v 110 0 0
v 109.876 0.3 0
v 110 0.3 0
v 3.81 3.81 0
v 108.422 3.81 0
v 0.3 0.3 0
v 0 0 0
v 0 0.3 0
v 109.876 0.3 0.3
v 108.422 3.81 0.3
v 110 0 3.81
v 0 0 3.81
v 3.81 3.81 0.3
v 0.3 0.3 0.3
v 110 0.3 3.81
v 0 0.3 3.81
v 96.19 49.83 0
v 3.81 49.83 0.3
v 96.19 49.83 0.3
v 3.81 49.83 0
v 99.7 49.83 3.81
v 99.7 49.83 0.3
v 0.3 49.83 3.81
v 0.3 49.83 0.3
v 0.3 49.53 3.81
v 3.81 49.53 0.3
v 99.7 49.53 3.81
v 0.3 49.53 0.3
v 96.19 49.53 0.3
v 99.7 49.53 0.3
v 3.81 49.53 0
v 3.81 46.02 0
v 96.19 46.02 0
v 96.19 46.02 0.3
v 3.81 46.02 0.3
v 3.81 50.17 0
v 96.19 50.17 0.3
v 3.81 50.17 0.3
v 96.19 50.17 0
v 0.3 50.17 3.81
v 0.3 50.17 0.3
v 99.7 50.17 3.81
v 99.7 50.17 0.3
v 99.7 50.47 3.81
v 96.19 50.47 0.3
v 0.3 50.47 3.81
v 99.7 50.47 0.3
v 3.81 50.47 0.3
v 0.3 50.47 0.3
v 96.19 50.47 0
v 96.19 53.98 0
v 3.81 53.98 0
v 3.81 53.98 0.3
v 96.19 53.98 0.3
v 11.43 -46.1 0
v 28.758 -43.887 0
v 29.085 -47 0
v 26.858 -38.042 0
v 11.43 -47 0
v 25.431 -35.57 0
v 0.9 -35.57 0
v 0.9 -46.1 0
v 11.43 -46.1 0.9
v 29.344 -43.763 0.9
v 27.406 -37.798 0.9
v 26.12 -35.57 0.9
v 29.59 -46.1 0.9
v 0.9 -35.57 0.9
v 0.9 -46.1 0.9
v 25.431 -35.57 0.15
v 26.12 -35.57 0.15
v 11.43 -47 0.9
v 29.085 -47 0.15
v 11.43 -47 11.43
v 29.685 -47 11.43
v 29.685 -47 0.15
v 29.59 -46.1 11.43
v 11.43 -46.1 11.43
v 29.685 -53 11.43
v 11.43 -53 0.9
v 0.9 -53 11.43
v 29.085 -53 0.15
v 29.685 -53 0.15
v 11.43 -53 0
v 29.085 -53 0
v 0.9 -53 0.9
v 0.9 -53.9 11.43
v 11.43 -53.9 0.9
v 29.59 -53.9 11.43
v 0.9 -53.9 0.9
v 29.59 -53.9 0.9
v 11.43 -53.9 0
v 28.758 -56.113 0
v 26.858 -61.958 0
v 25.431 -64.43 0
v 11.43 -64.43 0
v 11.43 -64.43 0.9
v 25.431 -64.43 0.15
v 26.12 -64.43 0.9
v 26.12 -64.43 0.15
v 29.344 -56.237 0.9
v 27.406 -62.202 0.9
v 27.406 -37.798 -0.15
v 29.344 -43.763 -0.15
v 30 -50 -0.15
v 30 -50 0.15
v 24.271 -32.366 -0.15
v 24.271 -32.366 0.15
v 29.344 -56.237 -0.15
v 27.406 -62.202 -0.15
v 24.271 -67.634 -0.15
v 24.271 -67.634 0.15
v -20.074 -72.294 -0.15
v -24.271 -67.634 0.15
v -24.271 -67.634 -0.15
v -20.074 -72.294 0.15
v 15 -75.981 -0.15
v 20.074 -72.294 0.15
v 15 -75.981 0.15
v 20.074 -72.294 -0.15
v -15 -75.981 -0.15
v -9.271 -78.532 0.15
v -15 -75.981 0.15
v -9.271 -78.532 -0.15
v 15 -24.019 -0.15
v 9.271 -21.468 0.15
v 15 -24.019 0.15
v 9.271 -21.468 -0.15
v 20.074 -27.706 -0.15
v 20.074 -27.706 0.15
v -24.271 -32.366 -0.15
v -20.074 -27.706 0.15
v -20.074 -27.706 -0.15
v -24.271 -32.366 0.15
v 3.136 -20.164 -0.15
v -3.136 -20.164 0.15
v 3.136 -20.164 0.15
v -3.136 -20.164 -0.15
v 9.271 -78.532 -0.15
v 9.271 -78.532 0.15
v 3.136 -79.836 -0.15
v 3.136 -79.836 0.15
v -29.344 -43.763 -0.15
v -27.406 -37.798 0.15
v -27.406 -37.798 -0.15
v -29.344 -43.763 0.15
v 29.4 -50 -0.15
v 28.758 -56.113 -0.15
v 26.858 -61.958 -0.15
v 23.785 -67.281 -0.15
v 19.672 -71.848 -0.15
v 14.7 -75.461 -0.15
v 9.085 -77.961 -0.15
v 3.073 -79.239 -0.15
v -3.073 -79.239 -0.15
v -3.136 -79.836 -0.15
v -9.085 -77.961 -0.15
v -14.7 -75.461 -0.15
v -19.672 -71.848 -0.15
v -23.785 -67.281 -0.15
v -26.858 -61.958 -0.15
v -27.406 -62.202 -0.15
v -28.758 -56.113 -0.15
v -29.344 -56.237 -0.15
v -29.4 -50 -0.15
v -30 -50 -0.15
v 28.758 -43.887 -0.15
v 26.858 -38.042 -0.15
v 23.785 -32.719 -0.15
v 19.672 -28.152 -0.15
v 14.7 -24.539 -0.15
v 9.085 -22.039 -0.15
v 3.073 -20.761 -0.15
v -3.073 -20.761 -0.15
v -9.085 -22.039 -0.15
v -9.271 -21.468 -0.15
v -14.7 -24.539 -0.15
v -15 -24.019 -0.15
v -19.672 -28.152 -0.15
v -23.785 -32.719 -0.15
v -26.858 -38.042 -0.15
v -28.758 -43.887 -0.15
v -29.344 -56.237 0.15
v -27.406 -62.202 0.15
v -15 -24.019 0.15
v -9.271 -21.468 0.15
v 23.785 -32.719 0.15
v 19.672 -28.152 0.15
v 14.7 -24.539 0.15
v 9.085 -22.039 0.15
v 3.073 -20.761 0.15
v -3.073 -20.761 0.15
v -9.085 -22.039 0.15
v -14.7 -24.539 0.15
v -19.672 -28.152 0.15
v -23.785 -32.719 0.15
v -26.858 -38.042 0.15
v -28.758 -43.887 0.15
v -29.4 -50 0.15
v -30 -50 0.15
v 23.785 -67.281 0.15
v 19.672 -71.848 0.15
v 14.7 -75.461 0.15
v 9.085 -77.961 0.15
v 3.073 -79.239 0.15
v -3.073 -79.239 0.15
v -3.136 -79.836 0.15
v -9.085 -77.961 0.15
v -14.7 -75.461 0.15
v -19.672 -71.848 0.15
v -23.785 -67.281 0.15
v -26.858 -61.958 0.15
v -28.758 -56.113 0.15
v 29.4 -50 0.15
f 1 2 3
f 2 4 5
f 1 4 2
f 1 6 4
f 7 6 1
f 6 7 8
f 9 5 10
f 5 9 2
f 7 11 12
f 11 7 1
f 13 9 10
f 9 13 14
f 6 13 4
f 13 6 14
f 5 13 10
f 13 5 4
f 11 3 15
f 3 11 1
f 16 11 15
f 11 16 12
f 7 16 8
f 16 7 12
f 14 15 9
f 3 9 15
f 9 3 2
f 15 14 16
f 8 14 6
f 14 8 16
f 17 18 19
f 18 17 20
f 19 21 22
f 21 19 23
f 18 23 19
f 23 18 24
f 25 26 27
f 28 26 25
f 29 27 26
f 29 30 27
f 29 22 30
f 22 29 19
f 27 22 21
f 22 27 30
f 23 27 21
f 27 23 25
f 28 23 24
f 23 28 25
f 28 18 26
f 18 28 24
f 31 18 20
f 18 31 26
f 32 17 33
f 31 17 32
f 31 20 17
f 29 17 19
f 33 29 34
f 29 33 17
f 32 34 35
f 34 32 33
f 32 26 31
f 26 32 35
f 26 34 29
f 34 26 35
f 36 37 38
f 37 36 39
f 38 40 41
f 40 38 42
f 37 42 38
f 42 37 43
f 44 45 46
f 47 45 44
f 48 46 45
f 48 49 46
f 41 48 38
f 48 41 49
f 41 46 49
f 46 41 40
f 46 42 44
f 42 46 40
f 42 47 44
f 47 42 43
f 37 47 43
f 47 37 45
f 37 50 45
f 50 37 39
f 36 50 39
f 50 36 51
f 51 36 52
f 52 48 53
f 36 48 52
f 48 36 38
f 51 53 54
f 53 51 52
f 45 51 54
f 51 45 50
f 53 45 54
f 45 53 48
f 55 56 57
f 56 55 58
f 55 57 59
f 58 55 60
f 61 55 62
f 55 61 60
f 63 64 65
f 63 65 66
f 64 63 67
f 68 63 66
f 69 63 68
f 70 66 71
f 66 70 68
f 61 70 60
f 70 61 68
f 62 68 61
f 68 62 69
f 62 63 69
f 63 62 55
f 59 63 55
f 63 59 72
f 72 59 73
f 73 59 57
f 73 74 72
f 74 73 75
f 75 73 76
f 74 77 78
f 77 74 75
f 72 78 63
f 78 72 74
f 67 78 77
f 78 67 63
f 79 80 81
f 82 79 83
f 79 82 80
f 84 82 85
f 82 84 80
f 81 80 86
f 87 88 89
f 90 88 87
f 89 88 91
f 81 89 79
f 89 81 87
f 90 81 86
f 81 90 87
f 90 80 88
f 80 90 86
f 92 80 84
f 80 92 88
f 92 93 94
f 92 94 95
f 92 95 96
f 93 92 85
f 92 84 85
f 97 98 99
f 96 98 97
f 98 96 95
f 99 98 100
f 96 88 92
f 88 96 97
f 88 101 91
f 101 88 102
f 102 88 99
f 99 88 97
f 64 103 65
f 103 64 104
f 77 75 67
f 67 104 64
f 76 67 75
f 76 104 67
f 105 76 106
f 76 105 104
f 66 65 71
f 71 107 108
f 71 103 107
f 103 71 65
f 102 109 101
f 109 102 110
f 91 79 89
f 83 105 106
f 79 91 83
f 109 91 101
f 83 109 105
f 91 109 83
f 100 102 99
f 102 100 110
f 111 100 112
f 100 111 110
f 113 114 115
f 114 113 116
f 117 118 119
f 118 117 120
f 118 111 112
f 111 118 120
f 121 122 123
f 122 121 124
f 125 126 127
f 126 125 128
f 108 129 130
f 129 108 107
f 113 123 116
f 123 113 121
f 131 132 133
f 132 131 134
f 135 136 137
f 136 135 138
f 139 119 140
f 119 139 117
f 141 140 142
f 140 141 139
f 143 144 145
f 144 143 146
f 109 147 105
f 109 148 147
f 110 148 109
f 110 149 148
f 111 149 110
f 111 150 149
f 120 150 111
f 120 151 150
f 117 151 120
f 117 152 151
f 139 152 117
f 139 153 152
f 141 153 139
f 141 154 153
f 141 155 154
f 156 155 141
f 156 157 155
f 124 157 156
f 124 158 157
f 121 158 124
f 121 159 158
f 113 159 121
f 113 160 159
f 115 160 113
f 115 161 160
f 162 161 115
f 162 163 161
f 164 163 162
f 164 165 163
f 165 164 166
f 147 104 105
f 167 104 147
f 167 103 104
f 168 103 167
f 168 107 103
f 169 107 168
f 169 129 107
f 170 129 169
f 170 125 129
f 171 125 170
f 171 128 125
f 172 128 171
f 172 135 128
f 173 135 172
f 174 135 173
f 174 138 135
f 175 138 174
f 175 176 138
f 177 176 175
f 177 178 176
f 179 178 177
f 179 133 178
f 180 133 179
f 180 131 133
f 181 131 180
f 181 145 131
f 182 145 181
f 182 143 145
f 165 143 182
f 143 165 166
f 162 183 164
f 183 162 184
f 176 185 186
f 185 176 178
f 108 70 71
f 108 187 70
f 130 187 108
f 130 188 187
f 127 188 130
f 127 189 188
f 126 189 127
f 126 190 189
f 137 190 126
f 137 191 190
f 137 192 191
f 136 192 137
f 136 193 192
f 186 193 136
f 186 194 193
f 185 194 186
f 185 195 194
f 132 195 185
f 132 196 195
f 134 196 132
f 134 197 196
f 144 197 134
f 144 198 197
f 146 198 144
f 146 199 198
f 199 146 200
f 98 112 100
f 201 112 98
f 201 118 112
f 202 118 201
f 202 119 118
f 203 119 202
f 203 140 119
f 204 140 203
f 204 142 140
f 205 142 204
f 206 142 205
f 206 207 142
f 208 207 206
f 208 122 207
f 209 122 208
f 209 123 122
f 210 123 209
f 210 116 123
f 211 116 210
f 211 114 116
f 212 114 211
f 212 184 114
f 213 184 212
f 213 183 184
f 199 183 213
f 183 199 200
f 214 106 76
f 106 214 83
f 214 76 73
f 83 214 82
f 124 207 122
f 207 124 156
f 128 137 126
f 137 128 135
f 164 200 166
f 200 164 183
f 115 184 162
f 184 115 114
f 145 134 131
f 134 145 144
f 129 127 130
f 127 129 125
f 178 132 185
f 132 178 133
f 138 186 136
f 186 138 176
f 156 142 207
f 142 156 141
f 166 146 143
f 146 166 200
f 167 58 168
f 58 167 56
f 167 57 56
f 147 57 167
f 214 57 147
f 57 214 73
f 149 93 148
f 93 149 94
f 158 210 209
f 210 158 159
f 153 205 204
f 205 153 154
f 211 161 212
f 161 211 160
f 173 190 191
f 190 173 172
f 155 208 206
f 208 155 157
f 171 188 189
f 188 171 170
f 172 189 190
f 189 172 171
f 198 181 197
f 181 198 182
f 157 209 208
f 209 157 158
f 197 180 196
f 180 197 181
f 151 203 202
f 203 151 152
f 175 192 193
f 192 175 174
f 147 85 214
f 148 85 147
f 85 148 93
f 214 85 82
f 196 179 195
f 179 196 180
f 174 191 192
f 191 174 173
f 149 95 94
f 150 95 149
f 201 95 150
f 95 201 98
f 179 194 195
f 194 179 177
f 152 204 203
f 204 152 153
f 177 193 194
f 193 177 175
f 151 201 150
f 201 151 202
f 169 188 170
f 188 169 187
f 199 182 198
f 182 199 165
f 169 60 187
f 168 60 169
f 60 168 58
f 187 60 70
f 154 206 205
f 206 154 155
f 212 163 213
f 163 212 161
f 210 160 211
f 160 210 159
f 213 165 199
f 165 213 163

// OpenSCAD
// file: ../hdim.scad
module hdim(x1 = 10, x2 = 200, y = 10, dimline_lenght = 9.0) 
{
    dimline_overlap = 0.5;
    dimline_width = 0.3;
    text_size = 4;
    tmp = 2*dimline_overlap+text_size/2;
    text_pos = dimline_lenght>0 ? tmp : -tmp; 
    dimline_abs = dimline_lenght>0 ? dimline_lenght : -dimline_lenght;
    
    color([0,0,0])
    {
        translate([x1,y-dimline_lenght/2,0]) 
            square([dimline_width, 
                dimline_abs + 2*dimline_overlap], 
                center=true, $fs=0.01);
                
        translate([x2,y-dimline_lenght/2,0]) 
            square([dimline_width, 
                dimline_abs + 2*dimline_overlap], 
                center=true, $fs=0.01);

        translate([(x1+x2)/2,y-dimline_lenght,0]) 
            square([x2-x1, 
                dimline_width], 
                center=true, $fs=0.01);
    }
        
    translate([(x1+x2)/2,y-dimline_lenght-text_pos,0]) 
    {
        color([0,0,0])
        cube([text_size * 5, 1.2*text_size, 0.9], center=true);
        
        color([0.8,0.8,0.5,1.0])
        {
            translate([0,0,0.2])
            text(str(0.1*round((x2-x1)*10)), size = text_size, 
                halign = "center",valign = "center");
            translate([0,0,-0.2])
            rotate([0,180,0])
            text(str(0.1*round((x2-x1)*10)), size = text_size, 
                halign = "center",valign = "center");
        }
    }
}

hdim();
// main file
use <../hdim.scad> 

module ceiling_corner_anglebar(length, 
    angle1 = 90,
    angle2 = 90,
    bar_diam = 1.5 * 2.54, 
    bar_t = 0.3,
    c = [0.5,0.1,0.1])
{
    color(c) 
    {
        linear_extrude(bar_t) 
        polygon(points=[[0,0],
            [tan(angle1)*bar_diam, bar_diam],
            [length-tan(angle2)*bar_diam, bar_diam],
            [length, 0], [0,0]]);
 
        cube([length, bar_t, bar_diam]);
    }

    translate([0,0,bar_diam/2]) 
    hdim(0, length, 0, 9);

}   

module ceiling_t_bar_half(length, 
    fix_diam1 = 1.5 * 2.54,
    fix_t1 = 0.4,
    fix_diam2 = 1.5 * 2.54,
    fix_t2 = 0.4,
    bar_diam = 1.5 * 2.54, 
    bar_t = 0.3,
    c = [0.5,0.1,0.1])
{
    color(c) 
    {
        linear_extrude(bar_t) 
        polygon(points=[[fix_t1, fix_t1],
            [fix_t1, bar_diam],
            [length-fix_t2, bar_diam],
            [length-fix_t2, fix_t2],
            [length-fix_diam2, fix_t2],
            [length-fix_diam2, 0],
            [fix_diam1, 0],
            [fix_diam1, fix_t1],
            [fix_t1, fix_t1],
            [fix_t1, bar_diam]]);
 
        
        translate([fix_diam1,0,0]) 
        cube([length-(fix_diam1+fix_diam2), bar_t, bar_diam]);
    }

    
}   

module ceiling_t_bar(length, 
    fix_diam1 = 1.5 * 2.54,
    fix_t1 = 0.3,
    fix_diam2 = 1.5 * 2.54,
    fix_t2 = 0.3,
    bar_diam = 1.5 * 2.54, 
    bar_t = 0.3,
    c = [0.5,0.1,0.1])
{
    translate([0,-bar_t/2-0.02,0])
    rotate([90,0,0])
    ceiling_t_bar_half(length, 
        fix_diam2, fix_t2,
        fix_diam1, fix_t1,
        bar_diam, bar_t,
        c);

    translate([length,bar_t/2+0.02,0])
    rotate([90,0,180])
    ceiling_t_bar_half(length, 
        fix_diam1, fix_t1,
        fix_diam2, fix_t2,
        bar_diam, bar_t,
        c);

//translate([0,0,bar_diam/2]) 
    hdim(fix_t1, length-fix_t2, 0, 12);
}

module ceiling_t_bar_end_circle(
    bar_diam = 1.5 * 2.54, 
    bar_t = 0.3,
    to_big = true)
{
    length = 30;
    fix_diam = to_big ? 1.5 * 2.54 : 2.54;
    fix_t = 0.3;
  
    scale(3)
    {
        intersection() {
            union() {
                translate([0,1,0])
                ceiling_t_bar_half(length, 
                    fix_diam, fix_t, 
                    fix_diam, fix_t,
                    bar_diam, bar_t, 
                    [0.5,0.7,0.1]);

                translate([0,-1,0])
                rotate([90,0,0])
                ceiling_t_bar_half(length, 
                    fix_diam, fix_t, 
                    fix_diam, fix_t,
                    bar_diam, bar_t, 
                    [0.5,0.7,0.1]);
            }

            cylinder(h = 10, r = 10, center=true);
        }
        
        difference() {
            cylinder(h = 0.1, r = 10, center=true);
            cylinder(h = 0.12, r = 9.8, center=true);
        }
        
        hdim (fix_t, fix_diam,-1.7-bar_diam, 10);
        
        translate([0,1,0])
        rotate([0,0,90])
        hdim (0, fix_t, 0.3, -10);

        translate([0,-1,0])
        rotate([0,0,90])
        hdim (-bar_diam, 0, -10.3, 10);
    }
   
    translate([-8,25,0])
    text(str(bar_diam > 3.5 ? "big" : "small", 
            " to ",
            to_big ? "big" : "small",
            " angle bar"));
}


ceiling_corner_anglebar(length = 110, 
    angle1 = 45,
    angle2 = 22.5);

translate([0,50,0])
ceiling_t_bar(length = 100);

translate([0,-50,0])
ceiling_t_bar_end_circle(
    bar_diam = 1.5 * 2.54, 
    bar_t = 0.3,
    to_big = true);
